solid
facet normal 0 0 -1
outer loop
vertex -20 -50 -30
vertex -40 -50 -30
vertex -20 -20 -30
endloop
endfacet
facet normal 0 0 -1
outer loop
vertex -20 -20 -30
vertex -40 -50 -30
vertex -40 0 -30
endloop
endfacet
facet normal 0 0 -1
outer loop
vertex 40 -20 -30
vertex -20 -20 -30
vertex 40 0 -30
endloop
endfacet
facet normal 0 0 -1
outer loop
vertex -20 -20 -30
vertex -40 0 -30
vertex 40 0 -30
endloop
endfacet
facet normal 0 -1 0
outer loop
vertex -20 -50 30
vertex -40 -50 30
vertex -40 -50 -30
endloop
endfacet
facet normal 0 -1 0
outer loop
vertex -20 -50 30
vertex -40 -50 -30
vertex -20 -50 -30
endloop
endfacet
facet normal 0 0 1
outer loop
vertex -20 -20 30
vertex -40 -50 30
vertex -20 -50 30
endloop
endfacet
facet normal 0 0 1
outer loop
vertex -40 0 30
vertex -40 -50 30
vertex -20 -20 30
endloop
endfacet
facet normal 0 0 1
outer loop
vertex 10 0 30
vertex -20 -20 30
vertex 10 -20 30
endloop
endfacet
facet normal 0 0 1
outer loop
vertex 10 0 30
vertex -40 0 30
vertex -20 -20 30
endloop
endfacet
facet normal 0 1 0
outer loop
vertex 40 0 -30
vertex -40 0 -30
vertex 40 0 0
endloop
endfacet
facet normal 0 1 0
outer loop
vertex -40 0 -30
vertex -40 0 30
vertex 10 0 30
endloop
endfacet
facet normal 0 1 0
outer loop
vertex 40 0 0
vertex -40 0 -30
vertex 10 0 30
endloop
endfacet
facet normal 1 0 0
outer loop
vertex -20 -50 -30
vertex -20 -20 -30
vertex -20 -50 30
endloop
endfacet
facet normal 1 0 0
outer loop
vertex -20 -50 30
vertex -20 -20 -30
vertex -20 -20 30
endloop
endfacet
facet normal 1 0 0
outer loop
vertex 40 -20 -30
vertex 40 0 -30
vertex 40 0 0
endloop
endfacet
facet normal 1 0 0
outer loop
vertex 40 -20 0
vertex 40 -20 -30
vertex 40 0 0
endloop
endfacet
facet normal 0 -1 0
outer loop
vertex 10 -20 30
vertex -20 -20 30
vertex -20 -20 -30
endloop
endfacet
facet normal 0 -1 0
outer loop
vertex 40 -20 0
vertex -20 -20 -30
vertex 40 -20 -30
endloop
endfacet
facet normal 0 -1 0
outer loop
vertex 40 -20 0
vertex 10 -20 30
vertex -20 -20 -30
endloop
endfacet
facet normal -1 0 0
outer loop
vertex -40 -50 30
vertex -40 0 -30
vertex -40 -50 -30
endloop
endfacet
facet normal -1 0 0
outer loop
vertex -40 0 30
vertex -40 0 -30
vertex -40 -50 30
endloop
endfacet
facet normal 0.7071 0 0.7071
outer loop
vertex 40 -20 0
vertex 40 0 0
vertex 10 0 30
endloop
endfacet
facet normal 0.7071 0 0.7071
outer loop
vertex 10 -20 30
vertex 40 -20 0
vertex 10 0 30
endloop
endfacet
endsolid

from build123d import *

# Parameters (mm, degrees)
F1_DEPTH = 20
F2_W     = 20
F2_H     = 60
F3_DEPTH = 30


with BuildPart() as f1:
    # F0 (on Front) → F1 (new body)
    with BuildSketch(Plane.XZ):
        Polygon((-40, 30), (-40, -30), (40, -30), (40, 0), (10, 30), align=None)
    extrude(amount=F1_DEPTH)

    # F2 (on face) → F3 (join)
    with BuildSketch(Plane.XZ.offset(20)):
        with Locations((-30, 0)):
            Rectangle(F2_W, F2_H)
    extrude(amount=F3_DEPTH)


solid = f1.part
